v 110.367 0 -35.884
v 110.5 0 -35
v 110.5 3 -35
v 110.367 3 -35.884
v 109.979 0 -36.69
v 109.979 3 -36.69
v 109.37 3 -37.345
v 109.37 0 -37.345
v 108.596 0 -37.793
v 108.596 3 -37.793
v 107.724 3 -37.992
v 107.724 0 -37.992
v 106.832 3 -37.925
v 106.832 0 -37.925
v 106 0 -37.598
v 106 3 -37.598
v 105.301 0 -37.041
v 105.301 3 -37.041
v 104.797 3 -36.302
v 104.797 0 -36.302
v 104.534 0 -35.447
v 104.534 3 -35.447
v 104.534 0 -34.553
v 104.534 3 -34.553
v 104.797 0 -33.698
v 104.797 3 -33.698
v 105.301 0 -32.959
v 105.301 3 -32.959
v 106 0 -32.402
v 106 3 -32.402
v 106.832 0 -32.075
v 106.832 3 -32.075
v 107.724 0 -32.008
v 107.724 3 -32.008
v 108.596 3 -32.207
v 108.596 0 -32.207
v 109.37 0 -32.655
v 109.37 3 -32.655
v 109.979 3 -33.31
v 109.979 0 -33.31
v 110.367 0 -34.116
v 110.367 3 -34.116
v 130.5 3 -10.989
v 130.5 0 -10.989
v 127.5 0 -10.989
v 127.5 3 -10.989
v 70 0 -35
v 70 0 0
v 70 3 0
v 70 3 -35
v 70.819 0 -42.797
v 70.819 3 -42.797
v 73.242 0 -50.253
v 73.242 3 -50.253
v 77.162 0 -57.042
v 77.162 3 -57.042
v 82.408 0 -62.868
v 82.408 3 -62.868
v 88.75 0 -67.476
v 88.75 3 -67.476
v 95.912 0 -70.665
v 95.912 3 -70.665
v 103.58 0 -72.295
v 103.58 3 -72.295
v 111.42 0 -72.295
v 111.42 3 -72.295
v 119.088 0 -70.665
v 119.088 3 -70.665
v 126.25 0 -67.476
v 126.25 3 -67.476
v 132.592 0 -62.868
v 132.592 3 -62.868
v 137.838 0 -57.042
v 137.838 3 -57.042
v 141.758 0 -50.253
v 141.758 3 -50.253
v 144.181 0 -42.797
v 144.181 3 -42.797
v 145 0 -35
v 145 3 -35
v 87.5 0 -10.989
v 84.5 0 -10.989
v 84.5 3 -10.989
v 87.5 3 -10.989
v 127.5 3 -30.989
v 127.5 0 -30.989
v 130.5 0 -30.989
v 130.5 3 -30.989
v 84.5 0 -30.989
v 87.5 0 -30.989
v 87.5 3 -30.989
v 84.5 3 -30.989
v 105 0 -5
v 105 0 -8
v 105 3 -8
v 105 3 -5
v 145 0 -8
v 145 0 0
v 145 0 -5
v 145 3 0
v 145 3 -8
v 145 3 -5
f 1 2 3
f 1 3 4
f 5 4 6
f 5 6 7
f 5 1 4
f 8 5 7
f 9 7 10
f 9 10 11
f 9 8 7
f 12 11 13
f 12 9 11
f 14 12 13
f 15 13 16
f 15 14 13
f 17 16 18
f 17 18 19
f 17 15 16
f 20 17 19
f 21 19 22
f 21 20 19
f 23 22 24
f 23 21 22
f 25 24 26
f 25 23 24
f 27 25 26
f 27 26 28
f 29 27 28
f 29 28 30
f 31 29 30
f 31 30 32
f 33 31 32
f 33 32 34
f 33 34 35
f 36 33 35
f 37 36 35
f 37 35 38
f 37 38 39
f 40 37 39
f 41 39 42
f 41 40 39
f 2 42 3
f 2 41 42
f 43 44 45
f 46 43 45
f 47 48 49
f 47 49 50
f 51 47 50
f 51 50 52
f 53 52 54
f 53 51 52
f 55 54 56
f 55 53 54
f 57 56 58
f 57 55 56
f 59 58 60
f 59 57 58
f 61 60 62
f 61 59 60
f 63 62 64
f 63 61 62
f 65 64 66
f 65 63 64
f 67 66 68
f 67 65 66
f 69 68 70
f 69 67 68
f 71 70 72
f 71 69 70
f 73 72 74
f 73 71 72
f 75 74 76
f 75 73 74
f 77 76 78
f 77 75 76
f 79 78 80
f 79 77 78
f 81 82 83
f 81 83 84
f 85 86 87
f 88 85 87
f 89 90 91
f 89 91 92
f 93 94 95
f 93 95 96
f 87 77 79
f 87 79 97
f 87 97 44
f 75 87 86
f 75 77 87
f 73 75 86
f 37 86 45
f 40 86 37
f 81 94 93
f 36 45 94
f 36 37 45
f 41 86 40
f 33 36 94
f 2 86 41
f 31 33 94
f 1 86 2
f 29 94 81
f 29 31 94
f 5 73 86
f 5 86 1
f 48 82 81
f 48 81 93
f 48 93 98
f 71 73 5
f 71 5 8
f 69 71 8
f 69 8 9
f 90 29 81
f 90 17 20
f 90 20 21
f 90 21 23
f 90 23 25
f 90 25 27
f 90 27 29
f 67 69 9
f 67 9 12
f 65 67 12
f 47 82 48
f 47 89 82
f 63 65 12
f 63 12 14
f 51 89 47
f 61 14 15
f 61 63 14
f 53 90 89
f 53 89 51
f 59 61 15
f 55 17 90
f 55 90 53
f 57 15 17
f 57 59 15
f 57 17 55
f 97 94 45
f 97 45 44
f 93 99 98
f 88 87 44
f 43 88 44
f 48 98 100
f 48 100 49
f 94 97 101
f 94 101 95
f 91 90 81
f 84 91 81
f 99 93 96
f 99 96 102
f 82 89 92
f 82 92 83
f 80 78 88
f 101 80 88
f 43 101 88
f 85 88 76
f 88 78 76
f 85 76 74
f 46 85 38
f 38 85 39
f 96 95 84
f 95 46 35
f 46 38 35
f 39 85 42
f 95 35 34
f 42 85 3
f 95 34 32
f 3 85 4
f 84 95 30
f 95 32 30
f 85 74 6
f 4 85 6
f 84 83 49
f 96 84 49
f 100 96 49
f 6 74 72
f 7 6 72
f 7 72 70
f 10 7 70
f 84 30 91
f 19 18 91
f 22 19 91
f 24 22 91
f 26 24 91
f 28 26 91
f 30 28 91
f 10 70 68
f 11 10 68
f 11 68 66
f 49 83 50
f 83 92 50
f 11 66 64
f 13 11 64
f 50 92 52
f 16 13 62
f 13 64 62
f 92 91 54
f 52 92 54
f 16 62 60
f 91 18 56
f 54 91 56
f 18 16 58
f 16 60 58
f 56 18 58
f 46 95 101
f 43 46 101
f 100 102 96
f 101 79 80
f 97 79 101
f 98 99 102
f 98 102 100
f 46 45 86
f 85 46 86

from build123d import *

# Parameters (mm, degrees)
SKETCH1_R           = 3
BOSS_EXTRUDE6_DEPTH = 3


with BuildPart() as part:
    # Sketch1 → Boss-Extrude6 (new body)
    with BuildSketch(Plane(origin=(0, 0, 0), x_dir=(1, 0, 0), z_dir=(0, 1, 0))):
        with BuildLine():
            ThreePointArc((70, 35), (107.5, 72.5), (145, 35))
            Line((145, 35), (145, 8))
            Line((145, 8), (105, 8))
            Line((105, 8), (105, 5))
            Line((105, 5), (145, 5))
            Line((145, 5), (145, 0))
            Line((145, 0), (70, 0))
            Line((70, 0), (70, 35))
        make_face()
        with Locations((107.5, 35)):
            Circle(SKETCH1_R, mode=Mode.SUBTRACT)
        Polygon((87.5, 10.989200562), (87.5, 20.989200562), (87.5, 30.989200562), (84.5, 30.989200562), (84.5, 10.989200562), align=None, mode=Mode.SUBTRACT)
        Polygon((130.5, 10.989200562), (127.5, 10.989200562), (127.5, 20.989200562), (127.5, 30.989200562), (130.5, 30.989200562), align=None, mode=Mode.SUBTRACT)
    extrude(amount=BOSS_EXTRUDE6_DEPTH)


solid = part.part
